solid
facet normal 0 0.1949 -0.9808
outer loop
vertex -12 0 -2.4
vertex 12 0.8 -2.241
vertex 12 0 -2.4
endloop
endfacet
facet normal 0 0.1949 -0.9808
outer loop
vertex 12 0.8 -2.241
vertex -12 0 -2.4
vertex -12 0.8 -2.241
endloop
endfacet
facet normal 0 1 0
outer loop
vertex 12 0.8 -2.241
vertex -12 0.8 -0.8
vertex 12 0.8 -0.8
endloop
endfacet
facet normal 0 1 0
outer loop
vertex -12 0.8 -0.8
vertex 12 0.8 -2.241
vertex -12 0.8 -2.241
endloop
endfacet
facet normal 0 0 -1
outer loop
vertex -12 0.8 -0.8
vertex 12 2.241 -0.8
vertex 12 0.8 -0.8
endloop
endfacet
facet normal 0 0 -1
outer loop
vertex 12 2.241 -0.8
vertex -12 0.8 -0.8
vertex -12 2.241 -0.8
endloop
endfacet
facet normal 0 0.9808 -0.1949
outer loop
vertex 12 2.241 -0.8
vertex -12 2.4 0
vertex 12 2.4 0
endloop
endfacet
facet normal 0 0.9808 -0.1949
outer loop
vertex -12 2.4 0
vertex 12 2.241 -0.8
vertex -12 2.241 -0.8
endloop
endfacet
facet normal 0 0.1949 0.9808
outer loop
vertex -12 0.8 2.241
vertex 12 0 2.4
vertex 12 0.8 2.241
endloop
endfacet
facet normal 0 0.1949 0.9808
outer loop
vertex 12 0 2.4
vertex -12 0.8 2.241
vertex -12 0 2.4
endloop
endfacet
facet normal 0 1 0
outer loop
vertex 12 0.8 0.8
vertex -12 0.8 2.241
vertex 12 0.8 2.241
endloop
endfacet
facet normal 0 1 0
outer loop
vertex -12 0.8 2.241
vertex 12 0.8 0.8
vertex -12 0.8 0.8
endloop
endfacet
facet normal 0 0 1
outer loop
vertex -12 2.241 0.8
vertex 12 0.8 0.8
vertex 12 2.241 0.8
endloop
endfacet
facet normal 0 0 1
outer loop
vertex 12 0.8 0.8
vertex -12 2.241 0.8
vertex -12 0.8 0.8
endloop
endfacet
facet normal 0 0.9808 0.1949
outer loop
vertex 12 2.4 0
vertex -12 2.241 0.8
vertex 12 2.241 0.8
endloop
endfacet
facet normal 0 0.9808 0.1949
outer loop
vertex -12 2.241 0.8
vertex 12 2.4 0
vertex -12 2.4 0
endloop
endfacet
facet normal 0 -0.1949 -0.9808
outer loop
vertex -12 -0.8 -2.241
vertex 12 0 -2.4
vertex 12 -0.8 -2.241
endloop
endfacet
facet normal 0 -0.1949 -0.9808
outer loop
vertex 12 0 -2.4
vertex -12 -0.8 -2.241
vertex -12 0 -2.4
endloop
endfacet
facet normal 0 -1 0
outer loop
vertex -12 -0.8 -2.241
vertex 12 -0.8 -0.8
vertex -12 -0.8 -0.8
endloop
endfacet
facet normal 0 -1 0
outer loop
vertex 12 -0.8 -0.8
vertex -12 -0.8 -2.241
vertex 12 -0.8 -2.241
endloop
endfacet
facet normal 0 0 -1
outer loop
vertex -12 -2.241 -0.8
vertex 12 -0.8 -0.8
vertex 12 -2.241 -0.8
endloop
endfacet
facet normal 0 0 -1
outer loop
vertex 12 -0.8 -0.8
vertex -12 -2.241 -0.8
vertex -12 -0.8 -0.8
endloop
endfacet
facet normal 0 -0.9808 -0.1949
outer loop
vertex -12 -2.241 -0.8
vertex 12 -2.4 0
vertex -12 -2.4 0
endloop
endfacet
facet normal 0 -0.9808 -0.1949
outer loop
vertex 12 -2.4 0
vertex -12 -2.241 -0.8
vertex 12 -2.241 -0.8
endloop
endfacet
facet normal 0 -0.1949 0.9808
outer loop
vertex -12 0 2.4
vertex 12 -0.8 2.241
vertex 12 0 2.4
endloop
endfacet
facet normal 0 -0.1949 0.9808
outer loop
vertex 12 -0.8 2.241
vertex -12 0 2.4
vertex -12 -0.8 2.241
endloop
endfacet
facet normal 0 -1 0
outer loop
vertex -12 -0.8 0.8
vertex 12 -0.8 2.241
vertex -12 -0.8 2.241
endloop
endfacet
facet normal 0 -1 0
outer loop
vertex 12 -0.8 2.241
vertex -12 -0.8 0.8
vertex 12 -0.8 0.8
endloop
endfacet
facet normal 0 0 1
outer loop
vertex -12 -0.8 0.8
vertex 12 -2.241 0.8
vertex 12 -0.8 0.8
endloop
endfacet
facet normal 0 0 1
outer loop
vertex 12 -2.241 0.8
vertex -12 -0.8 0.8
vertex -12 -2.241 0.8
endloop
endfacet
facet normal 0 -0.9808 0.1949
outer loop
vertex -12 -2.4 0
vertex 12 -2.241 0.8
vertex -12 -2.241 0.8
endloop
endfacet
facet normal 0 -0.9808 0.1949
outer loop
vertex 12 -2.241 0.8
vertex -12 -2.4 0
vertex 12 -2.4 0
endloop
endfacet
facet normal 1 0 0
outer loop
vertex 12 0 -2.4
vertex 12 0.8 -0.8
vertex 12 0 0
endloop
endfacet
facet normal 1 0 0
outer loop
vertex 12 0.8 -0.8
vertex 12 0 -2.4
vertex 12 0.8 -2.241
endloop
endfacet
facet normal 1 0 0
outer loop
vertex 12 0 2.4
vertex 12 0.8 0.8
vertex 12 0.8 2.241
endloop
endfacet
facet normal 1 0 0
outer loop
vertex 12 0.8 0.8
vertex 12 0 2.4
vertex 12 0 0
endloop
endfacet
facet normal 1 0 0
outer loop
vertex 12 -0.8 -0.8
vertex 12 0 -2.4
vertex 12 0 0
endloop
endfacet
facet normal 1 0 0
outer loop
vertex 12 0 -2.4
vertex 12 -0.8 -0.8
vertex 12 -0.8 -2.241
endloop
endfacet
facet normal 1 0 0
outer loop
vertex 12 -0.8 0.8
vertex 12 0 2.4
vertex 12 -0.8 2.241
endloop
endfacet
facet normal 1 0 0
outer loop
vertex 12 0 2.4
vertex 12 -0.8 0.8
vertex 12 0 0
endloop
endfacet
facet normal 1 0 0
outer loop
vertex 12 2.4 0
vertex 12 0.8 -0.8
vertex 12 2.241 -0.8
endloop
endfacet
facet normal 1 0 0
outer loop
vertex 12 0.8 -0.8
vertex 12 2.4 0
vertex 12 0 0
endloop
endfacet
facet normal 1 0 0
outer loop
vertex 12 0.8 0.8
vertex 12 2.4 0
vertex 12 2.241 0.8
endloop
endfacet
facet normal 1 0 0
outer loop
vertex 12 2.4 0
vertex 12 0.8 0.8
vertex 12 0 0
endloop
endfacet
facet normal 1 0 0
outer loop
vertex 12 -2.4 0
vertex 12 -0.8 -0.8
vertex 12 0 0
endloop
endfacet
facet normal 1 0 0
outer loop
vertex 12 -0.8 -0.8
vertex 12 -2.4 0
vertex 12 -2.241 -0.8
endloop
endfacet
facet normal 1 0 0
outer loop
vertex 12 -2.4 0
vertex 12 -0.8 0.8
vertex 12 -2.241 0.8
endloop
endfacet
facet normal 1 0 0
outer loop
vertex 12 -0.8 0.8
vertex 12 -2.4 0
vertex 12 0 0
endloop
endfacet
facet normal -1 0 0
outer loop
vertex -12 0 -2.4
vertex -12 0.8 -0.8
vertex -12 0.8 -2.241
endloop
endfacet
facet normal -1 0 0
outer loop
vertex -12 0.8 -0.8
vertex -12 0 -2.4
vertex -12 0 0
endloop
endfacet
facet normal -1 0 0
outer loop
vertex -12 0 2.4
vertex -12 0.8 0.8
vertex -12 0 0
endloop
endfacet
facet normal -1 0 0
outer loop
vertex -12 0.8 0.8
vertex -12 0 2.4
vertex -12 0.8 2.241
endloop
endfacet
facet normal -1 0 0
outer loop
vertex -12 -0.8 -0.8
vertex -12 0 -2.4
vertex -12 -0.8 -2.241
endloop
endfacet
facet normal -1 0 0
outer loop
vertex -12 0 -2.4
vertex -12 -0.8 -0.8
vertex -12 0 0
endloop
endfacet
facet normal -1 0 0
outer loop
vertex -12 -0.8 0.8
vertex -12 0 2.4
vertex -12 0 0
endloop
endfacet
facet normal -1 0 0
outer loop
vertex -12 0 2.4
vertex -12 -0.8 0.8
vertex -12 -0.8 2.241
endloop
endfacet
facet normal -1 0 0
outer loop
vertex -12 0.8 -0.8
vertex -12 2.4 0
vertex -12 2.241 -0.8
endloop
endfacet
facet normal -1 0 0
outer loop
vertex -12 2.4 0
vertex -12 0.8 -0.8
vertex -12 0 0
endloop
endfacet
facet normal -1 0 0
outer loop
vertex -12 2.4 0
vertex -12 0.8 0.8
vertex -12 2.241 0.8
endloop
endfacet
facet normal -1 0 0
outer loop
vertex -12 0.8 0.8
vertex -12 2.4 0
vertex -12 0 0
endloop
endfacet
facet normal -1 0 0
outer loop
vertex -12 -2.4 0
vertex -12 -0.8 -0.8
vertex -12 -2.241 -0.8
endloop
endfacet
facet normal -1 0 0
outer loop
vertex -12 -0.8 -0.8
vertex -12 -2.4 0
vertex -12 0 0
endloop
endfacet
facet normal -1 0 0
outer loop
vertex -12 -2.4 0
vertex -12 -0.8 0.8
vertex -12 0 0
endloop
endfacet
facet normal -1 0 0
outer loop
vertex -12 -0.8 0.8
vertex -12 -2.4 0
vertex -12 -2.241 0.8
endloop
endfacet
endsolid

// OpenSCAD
// file: ../p/axle.scad
use <../lib.scad>
function ldraw_lib__axle() = [
// 0 Axle
// 0 Name: axle.dat
// 0 Author: James Jessiman
// 0 !LDRAW_ORG Primitive UPDATE 2003-01
// 0 !LICENSE Licensed under CC BY 4.0 : see CAreadme.txt
// 
// 0 BFC CERTIFY CCW
  [0,"BFC","CERTIFY"],
  [0,"BFC","CCW"],
// 
// 0 !HISTORY 2000-04-23 [sbliss] Added conditional edges along outermost diameters
// 0 !HISTORY 2000-05-07 [PTadmin] Official Update 2000-01
// 0 !HISTORY 2002-11-08 [OrionP] Adjusted fit and precision
// 0 !HISTORY 2003-03-12 [PTadmin] Official Update 2003-01
// 0 !HISTORY 2007-06-24 [PTadmin] Header formatted for Contributor Agreement
// 0 !HISTORY 2008-07-01 [PTadmin] Official Update 2008-01
// 
// 
// 5 24 6 0 0 6 1 0 5.602 0 2 5.602 0 -2
  [5,24,6,0,0,6,1,0,5.602,0,2,5.602,0,-2],
// 5 24 0 0 6 0 1 6 2 0 5.602 -2 0 5.602
  [5,24,0,0,6,0,1,6,2,0,5.602,-2,0,5.602],
// 5 24 -6 0 0 -6 1 0 -5.602 0 -2 -5.602 0 2
  [5,24,-6,0,0,-6,1,0,-5.602,0,-2,-5.602,0,2],
// 5 24 0 0 -6 0 1 -6 -2 0 -5.602 2 0 -5.602
  [5,24,0,0,-6,0,1,-6,-2,0,-5.602,2,0,-5.602],
// 
// 2 24 6 0 0 5.602 0 2
  [2,24,6,0,0,5.602,0,2],
// 2 24 5.602 0 2 2 0 2
  [2,24,5.602,0,2,2,0,2],
// 2 24 2 0 2 2 0 5.602
  [2,24,2,0,2,2,0,5.602],
// 2 24 2 0 5.602 0 0 6
  [2,24,2,0,5.602,0,0,6],
// 2 24 -6 0 0 -5.602 0 2
  [2,24,-6,0,0,-5.602,0,2],
// 2 24 -5.602 0 2 -2 0 2
  [2,24,-5.602,0,2,-2,0,2],
// 2 24 -2 0 2 -2 0 5.602
  [2,24,-2,0,2,-2,0,5.602],
// 2 24 -2 0 5.602 -0 0 6
  [2,24,-2,0,5.602,-0,0,6],
// 2 24 6 0 -0 5.602 0 -2
  [2,24,6,0,-0,5.602,0,-2],
// 2 24 5.602 0 -2 2 0 -2
  [2,24,5.602,0,-2,2,0,-2],
// 2 24 2 0 -2 2 0 -5.602
  [2,24,2,0,-2,2,0,-5.602],
// 2 24 2 0 -5.602 0 0 -6
  [2,24,2,0,-5.602,0,0,-6],
// 2 24 -6 0 -0 -5.602 0 -2
  [2,24,-6,0,-0,-5.602,0,-2],
// 2 24 -5.602 0 -2 -2 0 -2
  [2,24,-5.602,0,-2,-2,0,-2],
// 2 24 -2 0 -2 -2 0 -5.602
  [2,24,-2,0,-2,-2,0,-5.602],
// 2 24 -2 0 -5.602 -0 0 -6
  [2,24,-2,0,-5.602,-0,0,-6],
// 2 24 6 1 0 5.602 1 2
  [2,24,6,1,0,5.602,1,2],
// 2 24 5.602 1 2 2 1 2
  [2,24,5.602,1,2,2,1,2],
// 2 24 2 1 2 2 1 5.602
  [2,24,2,1,2,2,1,5.602],
// 2 24 2 1 5.602 0 1 6
  [2,24,2,1,5.602,0,1,6],
// 2 24 -6 1 0 -5.602 1 2
  [2,24,-6,1,0,-5.602,1,2],
// 2 24 -5.602 1 2 -2 1 2
  [2,24,-5.602,1,2,-2,1,2],
// 2 24 -2 1 2 -2 1 5.602
  [2,24,-2,1,2,-2,1,5.602],
// 2 24 -2 1 5.602 -0 1 6
  [2,24,-2,1,5.602,-0,1,6],
// 2 24 6 1 -0 5.602 1 -2
  [2,24,6,1,-0,5.602,1,-2],
// 2 24 5.602 1 -2 2 1 -2
  [2,24,5.602,1,-2,2,1,-2],
// 2 24 2 1 -2 2 1 -5.602
  [2,24,2,1,-2,2,1,-5.602],
// 2 24 2 1 -5.602 0 1 -6
  [2,24,2,1,-5.602,0,1,-6],
// 2 24 -6 1 -0 -5.602 1 -2
  [2,24,-6,1,-0,-5.602,1,-2],
// 2 24 -5.602 1 -2 -2 1 -2
  [2,24,-5.602,1,-2,-2,1,-2],
// 2 24 -2 1 -2 -2 1 -5.602
  [2,24,-2,1,-2,-2,1,-5.602],
// 2 24 -2 1 -5.602 -0 1 -6
  [2,24,-2,1,-5.602,-0,1,-6],
// 
// 2 24 5.602 0 2 5.602 1 2
  [2,24,5.602,0,2,5.602,1,2],
// 2 24 2 0 2 2 1 2
  [2,24,2,0,2,2,1,2],
// 2 24 2 0 5.602 2 1 5.602
  [2,24,2,0,5.602,2,1,5.602],
// 2 24 -5.602 0 2 -5.602 1 2
  [2,24,-5.602,0,2,-5.602,1,2],
// 2 24 -2 0 2 -2 1 2
  [2,24,-2,0,2,-2,1,2],
// 2 24 -2 0 5.602 -2 1 5.602
  [2,24,-2,0,5.602,-2,1,5.602],
// 2 24 5.602 0 -2 5.602 1 -2
  [2,24,5.602,0,-2,5.602,1,-2],
// 2 24 2 0 -2 2 1 -2
  [2,24,2,0,-2,2,1,-2],
// 2 24 2 0 -5.602 2 1 -5.602
  [2,24,2,0,-5.602,2,1,-5.602],
// 2 24 -5.602 0 -2 -5.602 1 -2
  [2,24,-5.602,0,-2,-5.602,1,-2],
// 2 24 -2 0 -2 -2 1 -2
  [2,24,-2,0,-2,-2,1,-2],
// 2 24 -2 0 -5.602 -2 1 -5.602
  [2,24,-2,0,-5.602,-2,1,-5.602],
// 
// 4 16 6 0 0 6 1 0 5.602 1 2 5.602 0 2
  [4,16,6,0,0,6,1,0,5.602,1,2,5.602,0,2],
// 4 16 5.602 0 2 5.602 1 2 2 1 2 2 0 2
  [4,16,5.602,0,2,5.602,1,2,2,1,2,2,0,2],
// 4 16 2 0 2 2 1 2 2 1 5.602 2 0 5.602
  [4,16,2,0,2,2,1,2,2,1,5.602,2,0,5.602],
// 4 16 2 0 5.602 2 1 5.602 0 1 6 0 0 6
  [4,16,2,0,5.602,2,1,5.602,0,1,6,0,0,6],
// 4 16 -6 0 0 -5.602 0 2 -5.602 1 2 -6 1 0
  [4,16,-6,0,0,-5.602,0,2,-5.602,1,2,-6,1,0],
// 4 16 -5.602 0 2 -2 0 2 -2 1 2 -5.602 1 2
  [4,16,-5.602,0,2,-2,0,2,-2,1,2,-5.602,1,2],
// 4 16 -2 0 2 -2 0 5.602 -2 1 5.602 -2 1 2
  [4,16,-2,0,2,-2,0,5.602,-2,1,5.602,-2,1,2],
// 4 16 -2 0 5.602 -0 0 6 -0 1 6 -2 1 5.602
  [4,16,-2,0,5.602,-0,0,6,-0,1,6,-2,1,5.602],
// 4 16 6 0 -0 5.602 0 -2 5.602 1 -2 6 1 -0
  [4,16,6,0,-0,5.602,0,-2,5.602,1,-2,6,1,-0],
// 4 16 5.602 0 -2 2 0 -2 2 1 -2 5.602 1 -2
  [4,16,5.602,0,-2,2,0,-2,2,1,-2,5.602,1,-2],
// 4 16 2 0 -2 2 0 -5.602 2 1 -5.602 2 1 -2
  [4,16,2,0,-2,2,0,-5.602,2,1,-5.602,2,1,-2],
// 4 16 2 0 -5.602 0 0 -6 0 1 -6 2 1 -5.602
  [4,16,2,0,-5.602,0,0,-6,0,1,-6,2,1,-5.602],
// 4 16 -6 0 -0 -6 1 -0 -5.602 1 -2 -5.602 0 -2
  [4,16,-6,0,-0,-6,1,-0,-5.602,1,-2,-5.602,0,-2],
// 4 16 -5.602 0 -2 -5.602 1 -2 -2 1 -2 -2 0 -2
  [4,16,-5.602,0,-2,-5.602,1,-2,-2,1,-2,-2,0,-2],
// 4 16 -2 0 -2 -2 1 -2 -2 1 -5.602 -2 0 -5.602
  [4,16,-2,0,-2,-2,1,-2,-2,1,-5.602,-2,0,-5.602],
// 4 16 -2 0 -5.602 -2 1 -5.602 -0 1 -6 -0 0 -6
  [4,16,-2,0,-5.602,-2,1,-5.602,-0,1,-6,-0,0,-6],
// 
// 4 16 6 0 0 5.602 0 2 2 0 2 0 0 0
  [4,16,6,0,0,5.602,0,2,2,0,2,0,0,0],
// 4 16 -6 0 0 0 0 0 -2 0 2 -5.602 0 2
  [4,16,-6,0,0,0,0,0,-2,0,2,-5.602,0,2],
// 4 16 6 0 0 0 0 0 2 0 -2 5.602 0 -2
  [4,16,6,0,0,0,0,0,2,0,-2,5.602,0,-2],
// 4 16 -6 0 0 -5.602 0 -2 -2 0 -2 0 0 0
  [4,16,-6,0,0,-5.602,0,-2,-2,0,-2,0,0,0],
// 4 16 0 0 6 0 0 0 2 0 2 2 0 5.602
  [4,16,0,0,6,0,0,0,2,0,2,2,0,5.602],
// 4 16 0 0 6 -2 0 5.602 -2 0 2 0 0 0
  [4,16,0,0,6,-2,0,5.602,-2,0,2,0,0,0],
// 4 16 0 0 -6 2 0 -5.602 2 0 -2 0 0 0
  [4,16,0,0,-6,2,0,-5.602,2,0,-2,0,0,0],
// 4 16 0 0 -6 0 0 0 -2 0 -2 -2 0 -5.602
  [4,16,0,0,-6,0,0,0,-2,0,-2,-2,0,-5.602],
// 4 16 6 1 0 0 1 0 2 1 2 5.602 1 2
  [4,16,6,1,0,0,1,0,2,1,2,5.602,1,2],
// 4 16 -6 1 0 -5.602 1 2 -2 1 2 0 1 0
  [4,16,-6,1,0,-5.602,1,2,-2,1,2,0,1,0],
// 4 16 6 1 0 5.602 1 -2 2 1 -2 0 1 0
  [4,16,6,1,0,5.602,1,-2,2,1,-2,0,1,0],
// 4 16 -6 1 0 0 1 0 -2 1 -2 -5.602 1 -2
  [4,16,-6,1,0,0,1,0,-2,1,-2,-5.602,1,-2],
// 4 16 0 1 6 2 1 5.602 2 1 2 0 1 0
  [4,16,0,1,6,2,1,5.602,2,1,2,0,1,0],
// 4 16 0 1 6 0 1 0 -2 1 2 -2 1 5.602
  [4,16,0,1,6,0,1,0,-2,1,2,-2,1,5.602],
// 4 16 0 1 -6 0 1 0 2 1 -2 2 1 -5.602
  [4,16,0,1,-6,0,1,0,2,1,-2,2,1,-5.602],
// 4 16 0 1 -6 -2 1 -5.602 -2 1 -2 0 1 0
  [4,16,0,1,-6,-2,1,-5.602,-2,1,-2,0,1,0],
// 0
];
module ldraw_lib__axle(step=0, col=false, unit=2/5, alt=false, line=0.2, solid=!$preview)
    makepoly(ldraw_lib__axle(), step=step, col=col, unit=unit, alt=alt, line=line, solid=solid);
ldraw_lib__axle(line=0.2);
// main file
use <../lib.scad>
use <../p/axle.scad>
function ldraw_lib__4519() = [
// 0 Technic Axle  3
// 0 Name: 4519.dat
// 0 Author: James Jessiman
// 0 !LDRAW_ORG Part UPDATE 2005-01
// 0 !LICENSE Licensed under CC BY 4.0 : see CAreadme.txt
// 
// 0 BFC CERTIFY CCW
  [0,"BFC","CERTIFY"],
  [0,"BFC","CCW"],
// 
// 0 !HISTORY 2004-07-11 [guyvivan] BFC'ed
// 0 !HISTORY 2005-12-28 [PTadmin] Official Update 2005-01
// 0 !HISTORY 2007-07-08 [PTadmin] Header formatted for Contributor Agreement
// 0 !HISTORY 2008-07-01 [PTadmin] Official Update 2008-01
// 
// 
// 1 16 30 0 0 0 -60 0 1 0 0 0 0 1 axle.dat
  [1,16,30,0,0,0,-60,0,1,0,0,0,0,1, ldraw_lib__axle()],
// 0
// 
];
module ldraw_lib__4519(step=0, col=false, unit=2/5, alt=false, line=0.2, solid=!$preview)
    makepoly(ldraw_lib__4519(), step=step, col=col, unit=unit, alt=alt, line=line, solid=solid);
ldraw_lib__4519(line=0.2);
